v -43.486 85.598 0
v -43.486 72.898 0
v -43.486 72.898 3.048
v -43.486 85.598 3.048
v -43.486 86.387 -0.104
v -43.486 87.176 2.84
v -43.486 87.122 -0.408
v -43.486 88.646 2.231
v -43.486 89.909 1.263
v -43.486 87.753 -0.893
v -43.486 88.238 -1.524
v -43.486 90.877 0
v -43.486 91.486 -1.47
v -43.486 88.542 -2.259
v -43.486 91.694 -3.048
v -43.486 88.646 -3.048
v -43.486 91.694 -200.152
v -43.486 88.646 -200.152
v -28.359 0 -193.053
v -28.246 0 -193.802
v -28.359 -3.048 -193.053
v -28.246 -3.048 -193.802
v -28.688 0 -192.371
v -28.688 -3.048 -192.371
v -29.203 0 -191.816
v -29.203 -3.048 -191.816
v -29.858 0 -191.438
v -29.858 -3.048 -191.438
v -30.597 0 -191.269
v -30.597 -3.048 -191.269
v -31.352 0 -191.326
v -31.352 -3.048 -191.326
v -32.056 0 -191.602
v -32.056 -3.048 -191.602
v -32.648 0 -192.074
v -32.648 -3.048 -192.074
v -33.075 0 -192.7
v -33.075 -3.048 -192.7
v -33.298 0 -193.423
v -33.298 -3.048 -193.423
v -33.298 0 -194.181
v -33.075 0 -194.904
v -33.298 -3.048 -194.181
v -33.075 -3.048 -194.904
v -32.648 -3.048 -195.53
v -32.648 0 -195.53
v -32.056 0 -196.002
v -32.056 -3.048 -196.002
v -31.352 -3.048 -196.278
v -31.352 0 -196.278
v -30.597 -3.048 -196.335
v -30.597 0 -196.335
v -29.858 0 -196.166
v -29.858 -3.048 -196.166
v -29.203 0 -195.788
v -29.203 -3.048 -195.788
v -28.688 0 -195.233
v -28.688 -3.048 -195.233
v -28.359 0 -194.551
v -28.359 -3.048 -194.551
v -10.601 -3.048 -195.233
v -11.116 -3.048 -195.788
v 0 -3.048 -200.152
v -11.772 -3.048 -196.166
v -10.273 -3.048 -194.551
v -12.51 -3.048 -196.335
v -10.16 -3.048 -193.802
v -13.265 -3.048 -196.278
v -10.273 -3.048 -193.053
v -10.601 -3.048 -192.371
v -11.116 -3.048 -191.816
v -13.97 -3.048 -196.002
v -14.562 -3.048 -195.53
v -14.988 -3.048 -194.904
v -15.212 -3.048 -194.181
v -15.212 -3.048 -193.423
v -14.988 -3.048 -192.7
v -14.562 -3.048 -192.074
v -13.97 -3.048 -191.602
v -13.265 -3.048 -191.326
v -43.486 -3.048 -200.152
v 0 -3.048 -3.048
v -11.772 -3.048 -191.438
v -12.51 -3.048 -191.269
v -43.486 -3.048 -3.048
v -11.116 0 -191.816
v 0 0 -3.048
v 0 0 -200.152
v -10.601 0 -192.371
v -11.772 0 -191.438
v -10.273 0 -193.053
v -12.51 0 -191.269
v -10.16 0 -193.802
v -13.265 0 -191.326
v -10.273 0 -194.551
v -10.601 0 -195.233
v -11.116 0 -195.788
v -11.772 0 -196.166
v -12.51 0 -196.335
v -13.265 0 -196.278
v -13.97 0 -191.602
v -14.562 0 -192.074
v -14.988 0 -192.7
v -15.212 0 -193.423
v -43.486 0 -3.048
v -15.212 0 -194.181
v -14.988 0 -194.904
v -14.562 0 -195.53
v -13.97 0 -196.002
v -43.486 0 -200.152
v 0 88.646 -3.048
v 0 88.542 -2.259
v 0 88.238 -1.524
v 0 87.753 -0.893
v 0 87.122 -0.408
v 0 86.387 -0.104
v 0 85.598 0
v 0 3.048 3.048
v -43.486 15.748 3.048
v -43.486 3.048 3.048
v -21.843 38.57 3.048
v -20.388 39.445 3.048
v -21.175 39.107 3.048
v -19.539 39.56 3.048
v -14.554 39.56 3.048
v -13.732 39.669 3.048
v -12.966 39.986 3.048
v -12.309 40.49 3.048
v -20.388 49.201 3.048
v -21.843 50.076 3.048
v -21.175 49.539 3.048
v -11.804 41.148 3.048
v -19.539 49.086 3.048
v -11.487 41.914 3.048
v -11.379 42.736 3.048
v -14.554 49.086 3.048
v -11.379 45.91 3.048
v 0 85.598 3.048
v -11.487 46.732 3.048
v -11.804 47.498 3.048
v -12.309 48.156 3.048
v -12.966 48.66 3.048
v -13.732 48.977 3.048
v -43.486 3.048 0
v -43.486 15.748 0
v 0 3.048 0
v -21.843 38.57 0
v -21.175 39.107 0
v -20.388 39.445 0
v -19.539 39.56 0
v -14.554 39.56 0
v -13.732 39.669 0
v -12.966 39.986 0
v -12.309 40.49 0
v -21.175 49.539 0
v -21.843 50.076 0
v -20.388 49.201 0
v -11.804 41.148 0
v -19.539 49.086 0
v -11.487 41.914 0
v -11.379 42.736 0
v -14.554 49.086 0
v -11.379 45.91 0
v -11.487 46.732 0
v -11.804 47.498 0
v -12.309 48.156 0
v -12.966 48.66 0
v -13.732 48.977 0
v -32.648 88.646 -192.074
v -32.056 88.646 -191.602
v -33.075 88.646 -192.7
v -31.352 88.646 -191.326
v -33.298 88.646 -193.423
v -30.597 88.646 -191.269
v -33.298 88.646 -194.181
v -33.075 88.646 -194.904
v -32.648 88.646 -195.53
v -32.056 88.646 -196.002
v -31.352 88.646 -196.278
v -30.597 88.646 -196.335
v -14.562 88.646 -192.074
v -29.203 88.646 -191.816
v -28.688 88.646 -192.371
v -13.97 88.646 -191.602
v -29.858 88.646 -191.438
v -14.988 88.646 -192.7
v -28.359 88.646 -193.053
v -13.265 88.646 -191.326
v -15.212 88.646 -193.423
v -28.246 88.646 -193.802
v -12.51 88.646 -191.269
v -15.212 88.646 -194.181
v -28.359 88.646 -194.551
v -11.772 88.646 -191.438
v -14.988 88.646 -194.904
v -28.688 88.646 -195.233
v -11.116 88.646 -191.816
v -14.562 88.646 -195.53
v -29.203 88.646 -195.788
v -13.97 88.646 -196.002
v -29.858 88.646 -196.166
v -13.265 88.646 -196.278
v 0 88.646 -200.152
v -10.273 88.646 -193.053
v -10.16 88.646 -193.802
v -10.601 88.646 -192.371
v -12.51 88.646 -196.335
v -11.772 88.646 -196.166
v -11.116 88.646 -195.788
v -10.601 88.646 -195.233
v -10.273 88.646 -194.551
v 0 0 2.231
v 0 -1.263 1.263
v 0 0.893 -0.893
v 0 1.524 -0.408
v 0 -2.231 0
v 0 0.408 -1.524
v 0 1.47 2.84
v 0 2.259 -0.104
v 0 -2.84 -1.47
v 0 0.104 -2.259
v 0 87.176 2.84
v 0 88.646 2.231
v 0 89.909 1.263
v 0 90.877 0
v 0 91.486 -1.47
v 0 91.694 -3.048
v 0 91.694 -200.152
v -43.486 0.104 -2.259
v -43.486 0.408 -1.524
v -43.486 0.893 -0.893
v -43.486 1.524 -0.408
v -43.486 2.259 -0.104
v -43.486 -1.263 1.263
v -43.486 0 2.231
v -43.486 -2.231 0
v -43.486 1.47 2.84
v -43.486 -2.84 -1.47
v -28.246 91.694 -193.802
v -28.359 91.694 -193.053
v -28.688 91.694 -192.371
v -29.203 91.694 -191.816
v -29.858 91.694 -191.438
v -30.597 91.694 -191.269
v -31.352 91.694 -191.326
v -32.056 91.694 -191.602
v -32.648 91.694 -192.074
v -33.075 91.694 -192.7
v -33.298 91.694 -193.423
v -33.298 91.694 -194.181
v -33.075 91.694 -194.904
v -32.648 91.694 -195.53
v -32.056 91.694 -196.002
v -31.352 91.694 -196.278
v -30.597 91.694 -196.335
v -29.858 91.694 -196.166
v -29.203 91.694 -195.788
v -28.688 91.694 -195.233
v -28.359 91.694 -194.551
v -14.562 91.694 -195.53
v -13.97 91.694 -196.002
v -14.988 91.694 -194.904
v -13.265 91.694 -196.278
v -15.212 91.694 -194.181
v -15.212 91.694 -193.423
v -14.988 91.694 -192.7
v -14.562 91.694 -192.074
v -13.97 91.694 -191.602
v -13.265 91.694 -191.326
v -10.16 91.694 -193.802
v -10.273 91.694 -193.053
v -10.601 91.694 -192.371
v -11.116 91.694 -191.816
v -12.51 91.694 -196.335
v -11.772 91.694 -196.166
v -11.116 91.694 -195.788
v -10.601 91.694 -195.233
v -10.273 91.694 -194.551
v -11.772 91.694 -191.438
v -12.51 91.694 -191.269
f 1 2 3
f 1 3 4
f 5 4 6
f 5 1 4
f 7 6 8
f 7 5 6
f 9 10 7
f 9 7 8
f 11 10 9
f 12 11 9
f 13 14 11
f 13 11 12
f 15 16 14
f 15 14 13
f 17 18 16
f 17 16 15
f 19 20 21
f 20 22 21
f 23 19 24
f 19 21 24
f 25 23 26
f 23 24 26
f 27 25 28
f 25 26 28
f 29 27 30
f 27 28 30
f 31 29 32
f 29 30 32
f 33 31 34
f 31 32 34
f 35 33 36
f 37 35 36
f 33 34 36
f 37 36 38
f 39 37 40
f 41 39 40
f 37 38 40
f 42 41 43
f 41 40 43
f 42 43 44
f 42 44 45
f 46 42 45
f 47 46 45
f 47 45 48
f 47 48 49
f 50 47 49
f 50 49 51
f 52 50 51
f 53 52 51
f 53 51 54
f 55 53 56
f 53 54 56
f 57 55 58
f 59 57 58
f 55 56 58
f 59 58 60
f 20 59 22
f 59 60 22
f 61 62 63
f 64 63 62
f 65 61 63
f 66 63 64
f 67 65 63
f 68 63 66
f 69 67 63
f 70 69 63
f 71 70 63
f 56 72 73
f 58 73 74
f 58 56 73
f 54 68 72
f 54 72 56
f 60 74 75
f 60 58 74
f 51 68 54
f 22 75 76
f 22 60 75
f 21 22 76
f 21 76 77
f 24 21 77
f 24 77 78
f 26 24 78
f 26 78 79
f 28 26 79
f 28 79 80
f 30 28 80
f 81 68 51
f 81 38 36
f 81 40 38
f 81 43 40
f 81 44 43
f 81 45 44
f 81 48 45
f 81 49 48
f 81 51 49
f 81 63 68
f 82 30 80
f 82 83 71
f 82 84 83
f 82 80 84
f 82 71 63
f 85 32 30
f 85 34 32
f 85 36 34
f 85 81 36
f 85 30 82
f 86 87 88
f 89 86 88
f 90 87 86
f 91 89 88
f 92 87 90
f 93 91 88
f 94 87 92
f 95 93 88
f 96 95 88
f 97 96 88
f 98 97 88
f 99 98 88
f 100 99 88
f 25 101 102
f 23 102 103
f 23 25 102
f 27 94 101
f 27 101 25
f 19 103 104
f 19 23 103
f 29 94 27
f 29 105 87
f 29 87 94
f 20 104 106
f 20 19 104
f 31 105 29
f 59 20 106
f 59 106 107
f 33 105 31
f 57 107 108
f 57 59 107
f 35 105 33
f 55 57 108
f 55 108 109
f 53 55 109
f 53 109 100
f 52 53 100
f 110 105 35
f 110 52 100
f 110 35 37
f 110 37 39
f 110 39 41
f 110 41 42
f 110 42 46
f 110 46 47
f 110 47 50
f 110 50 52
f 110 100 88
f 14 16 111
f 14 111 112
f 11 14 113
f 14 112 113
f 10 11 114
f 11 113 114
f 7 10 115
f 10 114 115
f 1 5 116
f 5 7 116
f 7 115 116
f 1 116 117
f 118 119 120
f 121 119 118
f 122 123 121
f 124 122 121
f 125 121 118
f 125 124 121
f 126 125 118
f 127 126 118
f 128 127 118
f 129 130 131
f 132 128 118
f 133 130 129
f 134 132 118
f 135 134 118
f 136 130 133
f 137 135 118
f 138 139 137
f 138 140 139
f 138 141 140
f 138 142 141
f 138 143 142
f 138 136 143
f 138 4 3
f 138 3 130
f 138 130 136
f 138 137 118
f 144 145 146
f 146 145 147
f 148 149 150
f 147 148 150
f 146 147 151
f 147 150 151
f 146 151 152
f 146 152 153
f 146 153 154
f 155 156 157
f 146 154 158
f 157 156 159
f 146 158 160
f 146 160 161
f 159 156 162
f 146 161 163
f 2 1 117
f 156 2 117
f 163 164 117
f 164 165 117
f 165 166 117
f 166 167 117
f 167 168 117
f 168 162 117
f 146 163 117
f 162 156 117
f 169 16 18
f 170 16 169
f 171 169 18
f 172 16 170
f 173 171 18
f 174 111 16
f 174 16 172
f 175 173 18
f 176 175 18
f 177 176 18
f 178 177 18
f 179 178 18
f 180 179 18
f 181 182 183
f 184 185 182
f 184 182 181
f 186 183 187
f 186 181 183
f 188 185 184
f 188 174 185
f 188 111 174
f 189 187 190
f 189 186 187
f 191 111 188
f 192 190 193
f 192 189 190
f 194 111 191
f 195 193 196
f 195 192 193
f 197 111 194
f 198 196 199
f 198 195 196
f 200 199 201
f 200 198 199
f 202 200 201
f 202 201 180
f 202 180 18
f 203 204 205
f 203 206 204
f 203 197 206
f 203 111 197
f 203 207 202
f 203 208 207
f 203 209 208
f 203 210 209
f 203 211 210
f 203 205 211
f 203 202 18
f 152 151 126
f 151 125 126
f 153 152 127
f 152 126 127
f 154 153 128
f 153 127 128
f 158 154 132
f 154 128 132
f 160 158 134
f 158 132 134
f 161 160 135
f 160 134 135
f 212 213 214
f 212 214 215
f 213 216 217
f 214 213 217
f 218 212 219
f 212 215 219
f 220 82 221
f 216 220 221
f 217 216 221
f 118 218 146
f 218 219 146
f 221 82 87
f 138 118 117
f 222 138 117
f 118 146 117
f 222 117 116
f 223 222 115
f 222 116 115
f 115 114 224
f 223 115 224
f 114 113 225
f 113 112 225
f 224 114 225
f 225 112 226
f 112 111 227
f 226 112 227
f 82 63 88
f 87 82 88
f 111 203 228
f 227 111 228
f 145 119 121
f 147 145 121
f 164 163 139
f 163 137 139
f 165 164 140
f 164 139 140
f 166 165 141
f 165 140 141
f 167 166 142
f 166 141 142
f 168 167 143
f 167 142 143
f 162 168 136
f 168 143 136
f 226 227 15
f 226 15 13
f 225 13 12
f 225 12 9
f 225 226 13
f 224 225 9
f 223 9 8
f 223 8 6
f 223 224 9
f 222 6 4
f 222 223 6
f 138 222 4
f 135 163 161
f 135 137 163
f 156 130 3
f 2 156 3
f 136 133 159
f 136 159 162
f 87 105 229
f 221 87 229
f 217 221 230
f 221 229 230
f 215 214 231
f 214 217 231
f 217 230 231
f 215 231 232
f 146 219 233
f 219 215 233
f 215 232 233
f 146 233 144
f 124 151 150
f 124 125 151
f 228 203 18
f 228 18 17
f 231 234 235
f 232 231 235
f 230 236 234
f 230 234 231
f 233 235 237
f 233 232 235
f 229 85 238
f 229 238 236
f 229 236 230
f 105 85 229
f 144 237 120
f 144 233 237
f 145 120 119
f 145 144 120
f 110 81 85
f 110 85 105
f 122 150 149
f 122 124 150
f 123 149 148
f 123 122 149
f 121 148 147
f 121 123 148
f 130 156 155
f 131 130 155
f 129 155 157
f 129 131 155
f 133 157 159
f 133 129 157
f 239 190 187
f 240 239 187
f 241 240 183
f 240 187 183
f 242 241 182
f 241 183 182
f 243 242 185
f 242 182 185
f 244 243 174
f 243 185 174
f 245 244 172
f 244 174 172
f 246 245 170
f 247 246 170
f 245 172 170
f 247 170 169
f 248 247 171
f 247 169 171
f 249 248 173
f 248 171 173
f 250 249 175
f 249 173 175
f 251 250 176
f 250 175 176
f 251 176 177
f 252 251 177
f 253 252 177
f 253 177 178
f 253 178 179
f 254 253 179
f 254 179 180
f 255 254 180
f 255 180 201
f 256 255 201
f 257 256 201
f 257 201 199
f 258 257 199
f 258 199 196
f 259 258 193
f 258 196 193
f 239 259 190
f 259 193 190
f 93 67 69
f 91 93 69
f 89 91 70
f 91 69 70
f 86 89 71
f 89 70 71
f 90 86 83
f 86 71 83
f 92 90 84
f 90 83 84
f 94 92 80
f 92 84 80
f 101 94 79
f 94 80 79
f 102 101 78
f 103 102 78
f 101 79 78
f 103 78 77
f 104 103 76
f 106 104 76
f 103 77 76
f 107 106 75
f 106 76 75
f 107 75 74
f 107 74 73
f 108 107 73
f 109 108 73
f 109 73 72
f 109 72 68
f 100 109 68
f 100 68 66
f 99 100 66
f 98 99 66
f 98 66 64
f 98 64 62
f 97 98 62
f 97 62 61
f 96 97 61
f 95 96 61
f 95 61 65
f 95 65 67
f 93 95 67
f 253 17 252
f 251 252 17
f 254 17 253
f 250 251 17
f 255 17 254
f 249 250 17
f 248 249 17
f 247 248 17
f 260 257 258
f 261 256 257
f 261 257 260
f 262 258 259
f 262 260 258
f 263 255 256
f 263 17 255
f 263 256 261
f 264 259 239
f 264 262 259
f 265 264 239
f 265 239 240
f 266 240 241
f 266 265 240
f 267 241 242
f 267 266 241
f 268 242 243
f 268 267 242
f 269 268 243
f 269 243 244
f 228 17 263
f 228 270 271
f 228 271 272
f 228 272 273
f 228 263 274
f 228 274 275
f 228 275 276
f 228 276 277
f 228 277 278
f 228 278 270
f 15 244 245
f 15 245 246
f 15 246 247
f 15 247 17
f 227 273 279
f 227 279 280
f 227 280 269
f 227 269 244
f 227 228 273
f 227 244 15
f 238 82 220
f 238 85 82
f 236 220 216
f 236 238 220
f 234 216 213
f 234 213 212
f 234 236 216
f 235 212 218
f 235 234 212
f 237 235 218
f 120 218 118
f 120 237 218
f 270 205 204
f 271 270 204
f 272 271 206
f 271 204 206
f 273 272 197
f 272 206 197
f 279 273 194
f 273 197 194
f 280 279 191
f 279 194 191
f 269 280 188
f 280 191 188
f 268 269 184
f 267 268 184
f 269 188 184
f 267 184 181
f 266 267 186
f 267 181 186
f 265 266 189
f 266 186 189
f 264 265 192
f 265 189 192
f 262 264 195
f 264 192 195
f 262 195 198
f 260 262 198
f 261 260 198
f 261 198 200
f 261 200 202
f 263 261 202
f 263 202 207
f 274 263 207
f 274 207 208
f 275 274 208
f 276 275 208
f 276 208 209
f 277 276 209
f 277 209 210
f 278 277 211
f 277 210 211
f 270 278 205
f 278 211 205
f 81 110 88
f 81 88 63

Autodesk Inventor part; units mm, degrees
ref_plane "YZ Plane" through (0, 0, 0) normal (1, 0, 0) x (0, 1, 0)
ref_plane "XZ Plane" through (0, 0, 0) normal (0, 1, 0) x (-1, 0, 0)
ref_plane "XY Plane" through (0, 0, 0) normal (0, 0, 1) x (1, 0, 0)
sketch "Sketch1" plane through (0, 0, 0) normal (0, 0, 1) x (1, 0, 0)
  line L0 (0, 3.048) -> (-43.4864, 3.048) construction
  line L1 (-43.4864, 0) -> (-43.4864, 3.048)
  line L2 (-43.4864, 0) -> (0, 0)
  line L3 (0, 0) -> (0, 3.048)
  line L4 (0, 88.646) -> (-43.4864, 88.646)
  line L5 (-43.4864, 85.598) -> (-43.4864, 88.646)
  line L6 (-43.4864, 85.598) -> (0, 85.598) construction
  line L7 (0, 85.598) -> (0, 88.646)
  line L8 (0, 0) -> (-43.4864, 0)
  line L9 (-43.4864, 0) -> (-43.4864, 88.646)
  line L10 (-43.4864, 88.646) -> (0, 88.646)
  line L11 (0, 88.646) -> (0, 0)
extrude "Plate1" add sketch "Sketch1" along normal blind 3.048
sketch "Sketch2" plane through (-43.4864, 0, 0) normal (0, -1, 0) x (1, 0, 0)
  line L0 (43.4864, 0) -> (0, 0)
  line L1 (0, 0) -> (0, -200.152)
  line L2 (0, -200.152) -> (43.4864, -200.152)
  line L3 (43.4864, -200.152) -> (43.4864, 0)
edge flange "Flange1" height 203.2 angle 90 thickness 3.048 bend radius 3.048 thickness toward (0, -1, 0) relief tear relief width 3.048 relief depth 1.524 corner gap 3.048 corner form 0 edges at (-21.7432, 0, 0) (-21.7432, 88.646, 0) wall of the first edge with corners at (0, 0, 0) (-43.4864, 0, 0) (-43.4864, 0, -200.152) (0, 0, -200.152)
bend "Bend1"
corner "Corner1"
sketch "Sketch3" plane through (0, 0, 3.048) normal (0, 0, 1) x (1, 0, 0)
  line L0 (-43.4864, 3.048) -> (-43.4864, 15.748) construction
  line L1 (-43.4864, 15.748) -> (-21.8429, 38.5703)
  line L2 (-16.3873, 44.323) -> (-20.9038, 49.0855) construction
  line L3 (-43.4864, 85.598) -> (-43.4864, 72.898) construction
  line L4 (-43.4864, 3.048) -> (-43.4864, 85.598) projected
  line L5 (-43.4864, 72.898) -> (-43.4864, 15.748)
  line L6 (-19.5391, 49.0855) -> (-14.5538, 49.0855)
  line L7 (-11.3788, 45.9105) -> (-11.3788, 42.7355)
  line L8 (-14.5538, 39.5605) -> (-19.5391, 39.5605)
  line L9 (-20.9038, 39.5605) -> (-16.3873, 44.323) construction
  line L10 (-21.8429, 50.0757) -> (-43.4864, 72.898)
  arc A0 (-14.5538, 39.5605) -> (-11.3788, 42.7355) centre (-14.5538, 42.7355) ccw
  arc A1 (-11.3788, 45.9105) -> (-14.5538, 49.0855) centre (-14.5538, 45.9105) ccw
  arc A2 (-21.8429, 50.0757) -> (-19.5391, 49.0855) centre (-19.5391, 52.2605) ccw
  arc A3 (-19.5391, 39.5605) -> (-21.8429, 38.5703) centre (-19.5391, 36.3855) ccw
  line L11 (-43.4864, 3.048) -> (-43.4864, 85.598) projected
  point P0 (0, 0)
  point P1 (-11.3788, 49.0855)
  point P2 (-11.3788, 39.5605)
  dimension "d11" = 12.7
  dimension "d12" = 28.575
  dimension "d14" = 12.7
  dimension "d18" = 9.525
  dimension "d19" = 9.525
  dimension "d20" = 9.525
  dimension "d24" = 3.175
  dimension "d25" = 11.5054
extrude "Extrusion1" cut sketch "Sketch3" against normal up to next
sketch "Sketch4" plane through (-43.4864, -3.048, -200.152) normal (0, -1, 0) x (1, 0, 0)
  circle A0 centre (12.7, 6.35) radius 2.54
  circle A1 centre (30.7864, 6.35) radius 2.54
  line L0 (0, 0) -> (0, 197.104) projected
  line L1 (43.4864, 0) -> (0, 0) projected
  line L2 (43.4864, 0) -> (43.4864, 197.104) projected
  point P0 (43.4864, 200.152)
  dimension "d26" = 5.08
  dimension "d27" = 5.08
  dimension "d28" = 12.7
  dimension "d29" = 6.35
  dimension "d30" = 6.35
  dimension "d31" = 12.7
extrude "Extrusion2" cut sketch "Sketch4" against normal up to surface (94.742 mm away)
equation "\"d1\" = BendReliefWidth"
equation "\"d2\" = BendReliefDepth"
equation "\"d3\" = MinimumRemnant"
equation "\"d4\" = BendRadius"
equation "\"d7\" = BendRadius"
equation "\"d8\" = CornerReliefSize"
equation "\"d9\" = GapSize"
equation "\"d10\" = JacobiRadiusSize"
equation "\"BendRadius\" = Thickness"
equation "\"BendReliefWidth\" = Thickness"
equation "\"BendReliefDepth\" = 0.5 * Thickness"
equation "\"CornerReliefSize\" = 4 * Thickness"
equation "\"MinimumRemnant\" = 2 * Thickness"
equation "\"TransitionRadius\" = BendRadius"
equation "\"JacobiRadiusSize\" = BendRadius"
equation "\"GapSize\" = Thickness"
equation "\"d0\" = BendRadius"
equation "\"Thickness\" = 3.048"
properties part number "guidebar"
